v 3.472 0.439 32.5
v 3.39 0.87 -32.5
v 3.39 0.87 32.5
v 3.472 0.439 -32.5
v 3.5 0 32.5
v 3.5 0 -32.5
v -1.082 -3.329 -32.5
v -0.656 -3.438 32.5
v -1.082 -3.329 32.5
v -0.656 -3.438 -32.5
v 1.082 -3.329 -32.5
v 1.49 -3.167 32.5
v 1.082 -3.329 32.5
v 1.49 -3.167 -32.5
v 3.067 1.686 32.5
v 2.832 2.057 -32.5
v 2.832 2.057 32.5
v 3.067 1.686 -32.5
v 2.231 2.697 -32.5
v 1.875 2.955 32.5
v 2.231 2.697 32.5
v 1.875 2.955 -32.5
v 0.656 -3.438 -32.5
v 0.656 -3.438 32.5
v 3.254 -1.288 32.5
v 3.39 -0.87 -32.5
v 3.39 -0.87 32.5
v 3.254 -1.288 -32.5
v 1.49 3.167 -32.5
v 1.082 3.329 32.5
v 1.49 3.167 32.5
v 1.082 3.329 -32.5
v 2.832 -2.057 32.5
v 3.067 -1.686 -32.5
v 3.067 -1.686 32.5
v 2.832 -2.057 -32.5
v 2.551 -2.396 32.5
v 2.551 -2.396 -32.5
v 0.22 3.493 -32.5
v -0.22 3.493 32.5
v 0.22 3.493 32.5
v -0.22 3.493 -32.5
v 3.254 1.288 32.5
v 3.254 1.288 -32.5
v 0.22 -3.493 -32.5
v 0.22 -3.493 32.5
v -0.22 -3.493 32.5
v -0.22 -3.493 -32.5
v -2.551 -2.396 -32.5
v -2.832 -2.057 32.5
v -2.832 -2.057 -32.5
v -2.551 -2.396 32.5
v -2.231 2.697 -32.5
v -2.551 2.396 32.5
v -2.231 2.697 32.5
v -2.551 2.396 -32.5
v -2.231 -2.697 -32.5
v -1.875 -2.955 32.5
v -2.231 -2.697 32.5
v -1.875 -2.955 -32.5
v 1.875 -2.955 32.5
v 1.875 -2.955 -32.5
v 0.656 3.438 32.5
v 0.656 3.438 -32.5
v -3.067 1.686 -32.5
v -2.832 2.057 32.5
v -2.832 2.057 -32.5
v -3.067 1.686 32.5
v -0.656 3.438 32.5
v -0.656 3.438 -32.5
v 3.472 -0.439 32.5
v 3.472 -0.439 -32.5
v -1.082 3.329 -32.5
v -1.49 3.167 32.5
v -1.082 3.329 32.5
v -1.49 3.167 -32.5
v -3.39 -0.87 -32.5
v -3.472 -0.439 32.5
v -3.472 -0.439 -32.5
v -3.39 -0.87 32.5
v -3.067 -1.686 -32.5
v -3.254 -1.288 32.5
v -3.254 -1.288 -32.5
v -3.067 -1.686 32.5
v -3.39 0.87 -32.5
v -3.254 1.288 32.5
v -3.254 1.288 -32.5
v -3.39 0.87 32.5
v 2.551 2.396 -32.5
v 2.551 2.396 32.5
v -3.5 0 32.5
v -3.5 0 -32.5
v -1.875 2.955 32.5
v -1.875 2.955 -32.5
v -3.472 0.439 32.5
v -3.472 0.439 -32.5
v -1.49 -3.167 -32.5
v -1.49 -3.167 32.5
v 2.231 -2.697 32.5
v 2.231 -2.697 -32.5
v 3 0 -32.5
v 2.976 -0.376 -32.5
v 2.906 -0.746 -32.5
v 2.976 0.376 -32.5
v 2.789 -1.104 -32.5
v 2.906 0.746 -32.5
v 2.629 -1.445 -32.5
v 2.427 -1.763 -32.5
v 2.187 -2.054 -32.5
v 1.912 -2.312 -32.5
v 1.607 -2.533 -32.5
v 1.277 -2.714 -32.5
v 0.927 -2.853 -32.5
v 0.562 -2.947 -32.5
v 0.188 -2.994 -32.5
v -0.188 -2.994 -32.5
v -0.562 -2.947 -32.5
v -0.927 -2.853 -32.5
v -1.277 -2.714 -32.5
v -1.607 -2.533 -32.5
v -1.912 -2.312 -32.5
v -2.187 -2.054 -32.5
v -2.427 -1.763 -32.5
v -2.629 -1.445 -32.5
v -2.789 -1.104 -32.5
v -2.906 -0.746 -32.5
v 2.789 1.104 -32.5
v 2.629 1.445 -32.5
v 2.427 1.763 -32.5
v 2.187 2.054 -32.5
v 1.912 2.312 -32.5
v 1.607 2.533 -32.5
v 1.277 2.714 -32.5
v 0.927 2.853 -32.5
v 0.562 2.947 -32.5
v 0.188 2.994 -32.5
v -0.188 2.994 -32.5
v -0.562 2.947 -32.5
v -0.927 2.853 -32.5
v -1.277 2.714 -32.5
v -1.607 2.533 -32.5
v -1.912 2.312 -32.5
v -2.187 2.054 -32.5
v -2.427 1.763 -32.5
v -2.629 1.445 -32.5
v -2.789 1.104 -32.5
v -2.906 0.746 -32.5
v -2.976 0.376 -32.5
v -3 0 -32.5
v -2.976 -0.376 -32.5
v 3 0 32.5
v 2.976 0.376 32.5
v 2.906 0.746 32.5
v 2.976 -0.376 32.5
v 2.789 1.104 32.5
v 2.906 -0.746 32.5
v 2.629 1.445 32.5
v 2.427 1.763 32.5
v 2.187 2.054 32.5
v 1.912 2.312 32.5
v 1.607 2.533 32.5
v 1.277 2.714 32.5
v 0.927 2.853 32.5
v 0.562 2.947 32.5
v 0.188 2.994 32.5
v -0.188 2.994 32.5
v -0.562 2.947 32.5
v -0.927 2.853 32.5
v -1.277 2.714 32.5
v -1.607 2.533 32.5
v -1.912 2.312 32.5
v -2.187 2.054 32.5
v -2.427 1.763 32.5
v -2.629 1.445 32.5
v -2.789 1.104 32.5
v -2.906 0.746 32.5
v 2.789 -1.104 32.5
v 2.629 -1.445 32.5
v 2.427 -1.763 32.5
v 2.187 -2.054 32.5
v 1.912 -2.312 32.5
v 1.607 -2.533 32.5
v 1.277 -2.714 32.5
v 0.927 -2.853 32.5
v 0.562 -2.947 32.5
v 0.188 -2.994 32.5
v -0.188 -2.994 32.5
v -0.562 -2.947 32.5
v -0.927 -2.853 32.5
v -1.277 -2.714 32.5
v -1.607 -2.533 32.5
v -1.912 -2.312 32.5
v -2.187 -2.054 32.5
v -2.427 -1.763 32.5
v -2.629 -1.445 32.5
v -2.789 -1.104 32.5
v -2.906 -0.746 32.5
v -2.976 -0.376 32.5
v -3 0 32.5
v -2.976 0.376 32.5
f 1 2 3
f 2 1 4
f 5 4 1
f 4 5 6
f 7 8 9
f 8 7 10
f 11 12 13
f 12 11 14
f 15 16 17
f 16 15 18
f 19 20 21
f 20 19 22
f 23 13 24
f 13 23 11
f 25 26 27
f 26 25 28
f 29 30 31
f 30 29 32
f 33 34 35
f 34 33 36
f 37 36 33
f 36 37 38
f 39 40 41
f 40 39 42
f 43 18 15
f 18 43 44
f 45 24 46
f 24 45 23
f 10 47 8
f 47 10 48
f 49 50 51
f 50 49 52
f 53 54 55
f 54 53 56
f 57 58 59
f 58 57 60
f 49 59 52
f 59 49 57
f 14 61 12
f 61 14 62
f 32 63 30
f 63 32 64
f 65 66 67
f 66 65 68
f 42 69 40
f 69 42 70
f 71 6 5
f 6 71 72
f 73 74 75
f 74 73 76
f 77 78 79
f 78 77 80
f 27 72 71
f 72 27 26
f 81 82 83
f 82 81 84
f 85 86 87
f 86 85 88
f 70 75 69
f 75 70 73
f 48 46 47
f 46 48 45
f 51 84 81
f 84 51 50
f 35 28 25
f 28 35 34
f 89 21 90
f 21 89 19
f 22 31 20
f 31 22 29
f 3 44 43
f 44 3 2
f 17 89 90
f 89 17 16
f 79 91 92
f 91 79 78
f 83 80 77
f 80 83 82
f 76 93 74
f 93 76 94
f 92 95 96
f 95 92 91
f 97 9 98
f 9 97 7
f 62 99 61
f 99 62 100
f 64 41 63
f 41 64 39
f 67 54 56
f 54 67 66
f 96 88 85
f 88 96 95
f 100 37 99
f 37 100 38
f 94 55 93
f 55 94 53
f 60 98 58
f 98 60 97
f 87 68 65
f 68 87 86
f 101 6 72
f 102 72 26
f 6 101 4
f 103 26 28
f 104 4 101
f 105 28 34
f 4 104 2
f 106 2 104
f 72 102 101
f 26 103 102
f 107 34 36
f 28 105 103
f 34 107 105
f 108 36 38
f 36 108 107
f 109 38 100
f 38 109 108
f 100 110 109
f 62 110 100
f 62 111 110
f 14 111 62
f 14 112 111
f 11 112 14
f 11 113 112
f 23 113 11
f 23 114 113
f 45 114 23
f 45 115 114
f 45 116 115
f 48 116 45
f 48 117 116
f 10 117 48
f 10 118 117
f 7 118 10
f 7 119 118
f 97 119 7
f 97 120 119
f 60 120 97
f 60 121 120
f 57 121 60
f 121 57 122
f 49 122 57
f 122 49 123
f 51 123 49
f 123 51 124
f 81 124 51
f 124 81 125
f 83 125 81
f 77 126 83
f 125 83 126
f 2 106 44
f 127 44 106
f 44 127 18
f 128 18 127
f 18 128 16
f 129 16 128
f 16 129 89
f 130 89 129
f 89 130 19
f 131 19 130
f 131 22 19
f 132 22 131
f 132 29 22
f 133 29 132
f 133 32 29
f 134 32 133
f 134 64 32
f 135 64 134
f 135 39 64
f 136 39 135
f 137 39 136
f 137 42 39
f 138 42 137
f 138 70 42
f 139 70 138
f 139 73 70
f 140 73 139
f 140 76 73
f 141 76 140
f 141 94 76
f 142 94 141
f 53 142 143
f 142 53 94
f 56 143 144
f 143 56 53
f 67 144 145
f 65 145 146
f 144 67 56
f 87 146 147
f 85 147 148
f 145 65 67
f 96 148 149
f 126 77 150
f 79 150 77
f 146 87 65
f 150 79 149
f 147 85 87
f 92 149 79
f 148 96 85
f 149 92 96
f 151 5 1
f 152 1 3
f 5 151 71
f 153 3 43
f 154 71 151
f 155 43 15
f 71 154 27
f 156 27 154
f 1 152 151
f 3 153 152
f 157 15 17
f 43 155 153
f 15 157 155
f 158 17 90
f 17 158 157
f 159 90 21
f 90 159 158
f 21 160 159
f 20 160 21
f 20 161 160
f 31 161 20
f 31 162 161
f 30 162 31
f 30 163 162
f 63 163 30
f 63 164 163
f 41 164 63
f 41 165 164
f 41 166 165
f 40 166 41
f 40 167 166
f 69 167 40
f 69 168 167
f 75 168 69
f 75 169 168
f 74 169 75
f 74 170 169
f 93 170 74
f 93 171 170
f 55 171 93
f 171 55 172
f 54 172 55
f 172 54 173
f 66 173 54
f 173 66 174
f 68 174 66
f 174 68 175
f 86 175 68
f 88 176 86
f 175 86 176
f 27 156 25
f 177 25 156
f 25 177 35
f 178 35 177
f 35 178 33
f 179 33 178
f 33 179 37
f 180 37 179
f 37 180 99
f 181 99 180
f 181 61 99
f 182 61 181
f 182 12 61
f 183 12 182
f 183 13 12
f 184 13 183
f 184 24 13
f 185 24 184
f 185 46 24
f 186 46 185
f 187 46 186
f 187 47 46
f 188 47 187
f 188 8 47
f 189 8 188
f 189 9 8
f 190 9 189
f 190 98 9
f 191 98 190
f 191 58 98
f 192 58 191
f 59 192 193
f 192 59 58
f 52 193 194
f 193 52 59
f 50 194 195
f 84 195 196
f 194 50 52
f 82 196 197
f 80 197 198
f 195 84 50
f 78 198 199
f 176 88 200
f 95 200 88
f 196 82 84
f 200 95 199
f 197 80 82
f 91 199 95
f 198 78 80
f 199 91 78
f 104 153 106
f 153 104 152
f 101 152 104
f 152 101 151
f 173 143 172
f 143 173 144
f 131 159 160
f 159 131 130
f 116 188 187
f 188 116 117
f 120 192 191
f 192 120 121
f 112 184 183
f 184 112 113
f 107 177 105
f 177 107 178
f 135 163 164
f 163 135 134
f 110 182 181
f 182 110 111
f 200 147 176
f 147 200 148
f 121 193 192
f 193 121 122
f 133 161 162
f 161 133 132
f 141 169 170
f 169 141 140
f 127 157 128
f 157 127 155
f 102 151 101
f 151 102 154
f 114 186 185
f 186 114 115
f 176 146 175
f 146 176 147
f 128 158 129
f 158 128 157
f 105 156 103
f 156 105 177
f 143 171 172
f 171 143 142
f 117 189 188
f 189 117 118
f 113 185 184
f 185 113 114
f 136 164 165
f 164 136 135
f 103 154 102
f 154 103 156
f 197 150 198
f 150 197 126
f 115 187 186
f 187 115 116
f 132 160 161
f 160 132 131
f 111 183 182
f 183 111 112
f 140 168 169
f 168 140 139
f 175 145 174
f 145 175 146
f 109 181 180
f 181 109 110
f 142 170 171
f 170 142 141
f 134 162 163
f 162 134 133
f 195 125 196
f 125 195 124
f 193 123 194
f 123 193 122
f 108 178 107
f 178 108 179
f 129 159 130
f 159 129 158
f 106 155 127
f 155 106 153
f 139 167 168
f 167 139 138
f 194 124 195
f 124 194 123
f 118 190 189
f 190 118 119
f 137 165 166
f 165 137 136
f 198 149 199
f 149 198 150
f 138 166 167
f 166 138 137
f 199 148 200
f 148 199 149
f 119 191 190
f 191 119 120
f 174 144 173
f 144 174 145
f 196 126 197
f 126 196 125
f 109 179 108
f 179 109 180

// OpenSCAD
$fn = 50;


difference() {
	union() {
		translate(v = [0, 0, -32.5000000000]) {
			cylinder(h = 65, r = 3.5000000000);
		}
	}
	union() {
		translate(v = [0, 0, -100.0000000000]) {
			cylinder(h = 200, r = 3.0000000000);
		}
	}
}
